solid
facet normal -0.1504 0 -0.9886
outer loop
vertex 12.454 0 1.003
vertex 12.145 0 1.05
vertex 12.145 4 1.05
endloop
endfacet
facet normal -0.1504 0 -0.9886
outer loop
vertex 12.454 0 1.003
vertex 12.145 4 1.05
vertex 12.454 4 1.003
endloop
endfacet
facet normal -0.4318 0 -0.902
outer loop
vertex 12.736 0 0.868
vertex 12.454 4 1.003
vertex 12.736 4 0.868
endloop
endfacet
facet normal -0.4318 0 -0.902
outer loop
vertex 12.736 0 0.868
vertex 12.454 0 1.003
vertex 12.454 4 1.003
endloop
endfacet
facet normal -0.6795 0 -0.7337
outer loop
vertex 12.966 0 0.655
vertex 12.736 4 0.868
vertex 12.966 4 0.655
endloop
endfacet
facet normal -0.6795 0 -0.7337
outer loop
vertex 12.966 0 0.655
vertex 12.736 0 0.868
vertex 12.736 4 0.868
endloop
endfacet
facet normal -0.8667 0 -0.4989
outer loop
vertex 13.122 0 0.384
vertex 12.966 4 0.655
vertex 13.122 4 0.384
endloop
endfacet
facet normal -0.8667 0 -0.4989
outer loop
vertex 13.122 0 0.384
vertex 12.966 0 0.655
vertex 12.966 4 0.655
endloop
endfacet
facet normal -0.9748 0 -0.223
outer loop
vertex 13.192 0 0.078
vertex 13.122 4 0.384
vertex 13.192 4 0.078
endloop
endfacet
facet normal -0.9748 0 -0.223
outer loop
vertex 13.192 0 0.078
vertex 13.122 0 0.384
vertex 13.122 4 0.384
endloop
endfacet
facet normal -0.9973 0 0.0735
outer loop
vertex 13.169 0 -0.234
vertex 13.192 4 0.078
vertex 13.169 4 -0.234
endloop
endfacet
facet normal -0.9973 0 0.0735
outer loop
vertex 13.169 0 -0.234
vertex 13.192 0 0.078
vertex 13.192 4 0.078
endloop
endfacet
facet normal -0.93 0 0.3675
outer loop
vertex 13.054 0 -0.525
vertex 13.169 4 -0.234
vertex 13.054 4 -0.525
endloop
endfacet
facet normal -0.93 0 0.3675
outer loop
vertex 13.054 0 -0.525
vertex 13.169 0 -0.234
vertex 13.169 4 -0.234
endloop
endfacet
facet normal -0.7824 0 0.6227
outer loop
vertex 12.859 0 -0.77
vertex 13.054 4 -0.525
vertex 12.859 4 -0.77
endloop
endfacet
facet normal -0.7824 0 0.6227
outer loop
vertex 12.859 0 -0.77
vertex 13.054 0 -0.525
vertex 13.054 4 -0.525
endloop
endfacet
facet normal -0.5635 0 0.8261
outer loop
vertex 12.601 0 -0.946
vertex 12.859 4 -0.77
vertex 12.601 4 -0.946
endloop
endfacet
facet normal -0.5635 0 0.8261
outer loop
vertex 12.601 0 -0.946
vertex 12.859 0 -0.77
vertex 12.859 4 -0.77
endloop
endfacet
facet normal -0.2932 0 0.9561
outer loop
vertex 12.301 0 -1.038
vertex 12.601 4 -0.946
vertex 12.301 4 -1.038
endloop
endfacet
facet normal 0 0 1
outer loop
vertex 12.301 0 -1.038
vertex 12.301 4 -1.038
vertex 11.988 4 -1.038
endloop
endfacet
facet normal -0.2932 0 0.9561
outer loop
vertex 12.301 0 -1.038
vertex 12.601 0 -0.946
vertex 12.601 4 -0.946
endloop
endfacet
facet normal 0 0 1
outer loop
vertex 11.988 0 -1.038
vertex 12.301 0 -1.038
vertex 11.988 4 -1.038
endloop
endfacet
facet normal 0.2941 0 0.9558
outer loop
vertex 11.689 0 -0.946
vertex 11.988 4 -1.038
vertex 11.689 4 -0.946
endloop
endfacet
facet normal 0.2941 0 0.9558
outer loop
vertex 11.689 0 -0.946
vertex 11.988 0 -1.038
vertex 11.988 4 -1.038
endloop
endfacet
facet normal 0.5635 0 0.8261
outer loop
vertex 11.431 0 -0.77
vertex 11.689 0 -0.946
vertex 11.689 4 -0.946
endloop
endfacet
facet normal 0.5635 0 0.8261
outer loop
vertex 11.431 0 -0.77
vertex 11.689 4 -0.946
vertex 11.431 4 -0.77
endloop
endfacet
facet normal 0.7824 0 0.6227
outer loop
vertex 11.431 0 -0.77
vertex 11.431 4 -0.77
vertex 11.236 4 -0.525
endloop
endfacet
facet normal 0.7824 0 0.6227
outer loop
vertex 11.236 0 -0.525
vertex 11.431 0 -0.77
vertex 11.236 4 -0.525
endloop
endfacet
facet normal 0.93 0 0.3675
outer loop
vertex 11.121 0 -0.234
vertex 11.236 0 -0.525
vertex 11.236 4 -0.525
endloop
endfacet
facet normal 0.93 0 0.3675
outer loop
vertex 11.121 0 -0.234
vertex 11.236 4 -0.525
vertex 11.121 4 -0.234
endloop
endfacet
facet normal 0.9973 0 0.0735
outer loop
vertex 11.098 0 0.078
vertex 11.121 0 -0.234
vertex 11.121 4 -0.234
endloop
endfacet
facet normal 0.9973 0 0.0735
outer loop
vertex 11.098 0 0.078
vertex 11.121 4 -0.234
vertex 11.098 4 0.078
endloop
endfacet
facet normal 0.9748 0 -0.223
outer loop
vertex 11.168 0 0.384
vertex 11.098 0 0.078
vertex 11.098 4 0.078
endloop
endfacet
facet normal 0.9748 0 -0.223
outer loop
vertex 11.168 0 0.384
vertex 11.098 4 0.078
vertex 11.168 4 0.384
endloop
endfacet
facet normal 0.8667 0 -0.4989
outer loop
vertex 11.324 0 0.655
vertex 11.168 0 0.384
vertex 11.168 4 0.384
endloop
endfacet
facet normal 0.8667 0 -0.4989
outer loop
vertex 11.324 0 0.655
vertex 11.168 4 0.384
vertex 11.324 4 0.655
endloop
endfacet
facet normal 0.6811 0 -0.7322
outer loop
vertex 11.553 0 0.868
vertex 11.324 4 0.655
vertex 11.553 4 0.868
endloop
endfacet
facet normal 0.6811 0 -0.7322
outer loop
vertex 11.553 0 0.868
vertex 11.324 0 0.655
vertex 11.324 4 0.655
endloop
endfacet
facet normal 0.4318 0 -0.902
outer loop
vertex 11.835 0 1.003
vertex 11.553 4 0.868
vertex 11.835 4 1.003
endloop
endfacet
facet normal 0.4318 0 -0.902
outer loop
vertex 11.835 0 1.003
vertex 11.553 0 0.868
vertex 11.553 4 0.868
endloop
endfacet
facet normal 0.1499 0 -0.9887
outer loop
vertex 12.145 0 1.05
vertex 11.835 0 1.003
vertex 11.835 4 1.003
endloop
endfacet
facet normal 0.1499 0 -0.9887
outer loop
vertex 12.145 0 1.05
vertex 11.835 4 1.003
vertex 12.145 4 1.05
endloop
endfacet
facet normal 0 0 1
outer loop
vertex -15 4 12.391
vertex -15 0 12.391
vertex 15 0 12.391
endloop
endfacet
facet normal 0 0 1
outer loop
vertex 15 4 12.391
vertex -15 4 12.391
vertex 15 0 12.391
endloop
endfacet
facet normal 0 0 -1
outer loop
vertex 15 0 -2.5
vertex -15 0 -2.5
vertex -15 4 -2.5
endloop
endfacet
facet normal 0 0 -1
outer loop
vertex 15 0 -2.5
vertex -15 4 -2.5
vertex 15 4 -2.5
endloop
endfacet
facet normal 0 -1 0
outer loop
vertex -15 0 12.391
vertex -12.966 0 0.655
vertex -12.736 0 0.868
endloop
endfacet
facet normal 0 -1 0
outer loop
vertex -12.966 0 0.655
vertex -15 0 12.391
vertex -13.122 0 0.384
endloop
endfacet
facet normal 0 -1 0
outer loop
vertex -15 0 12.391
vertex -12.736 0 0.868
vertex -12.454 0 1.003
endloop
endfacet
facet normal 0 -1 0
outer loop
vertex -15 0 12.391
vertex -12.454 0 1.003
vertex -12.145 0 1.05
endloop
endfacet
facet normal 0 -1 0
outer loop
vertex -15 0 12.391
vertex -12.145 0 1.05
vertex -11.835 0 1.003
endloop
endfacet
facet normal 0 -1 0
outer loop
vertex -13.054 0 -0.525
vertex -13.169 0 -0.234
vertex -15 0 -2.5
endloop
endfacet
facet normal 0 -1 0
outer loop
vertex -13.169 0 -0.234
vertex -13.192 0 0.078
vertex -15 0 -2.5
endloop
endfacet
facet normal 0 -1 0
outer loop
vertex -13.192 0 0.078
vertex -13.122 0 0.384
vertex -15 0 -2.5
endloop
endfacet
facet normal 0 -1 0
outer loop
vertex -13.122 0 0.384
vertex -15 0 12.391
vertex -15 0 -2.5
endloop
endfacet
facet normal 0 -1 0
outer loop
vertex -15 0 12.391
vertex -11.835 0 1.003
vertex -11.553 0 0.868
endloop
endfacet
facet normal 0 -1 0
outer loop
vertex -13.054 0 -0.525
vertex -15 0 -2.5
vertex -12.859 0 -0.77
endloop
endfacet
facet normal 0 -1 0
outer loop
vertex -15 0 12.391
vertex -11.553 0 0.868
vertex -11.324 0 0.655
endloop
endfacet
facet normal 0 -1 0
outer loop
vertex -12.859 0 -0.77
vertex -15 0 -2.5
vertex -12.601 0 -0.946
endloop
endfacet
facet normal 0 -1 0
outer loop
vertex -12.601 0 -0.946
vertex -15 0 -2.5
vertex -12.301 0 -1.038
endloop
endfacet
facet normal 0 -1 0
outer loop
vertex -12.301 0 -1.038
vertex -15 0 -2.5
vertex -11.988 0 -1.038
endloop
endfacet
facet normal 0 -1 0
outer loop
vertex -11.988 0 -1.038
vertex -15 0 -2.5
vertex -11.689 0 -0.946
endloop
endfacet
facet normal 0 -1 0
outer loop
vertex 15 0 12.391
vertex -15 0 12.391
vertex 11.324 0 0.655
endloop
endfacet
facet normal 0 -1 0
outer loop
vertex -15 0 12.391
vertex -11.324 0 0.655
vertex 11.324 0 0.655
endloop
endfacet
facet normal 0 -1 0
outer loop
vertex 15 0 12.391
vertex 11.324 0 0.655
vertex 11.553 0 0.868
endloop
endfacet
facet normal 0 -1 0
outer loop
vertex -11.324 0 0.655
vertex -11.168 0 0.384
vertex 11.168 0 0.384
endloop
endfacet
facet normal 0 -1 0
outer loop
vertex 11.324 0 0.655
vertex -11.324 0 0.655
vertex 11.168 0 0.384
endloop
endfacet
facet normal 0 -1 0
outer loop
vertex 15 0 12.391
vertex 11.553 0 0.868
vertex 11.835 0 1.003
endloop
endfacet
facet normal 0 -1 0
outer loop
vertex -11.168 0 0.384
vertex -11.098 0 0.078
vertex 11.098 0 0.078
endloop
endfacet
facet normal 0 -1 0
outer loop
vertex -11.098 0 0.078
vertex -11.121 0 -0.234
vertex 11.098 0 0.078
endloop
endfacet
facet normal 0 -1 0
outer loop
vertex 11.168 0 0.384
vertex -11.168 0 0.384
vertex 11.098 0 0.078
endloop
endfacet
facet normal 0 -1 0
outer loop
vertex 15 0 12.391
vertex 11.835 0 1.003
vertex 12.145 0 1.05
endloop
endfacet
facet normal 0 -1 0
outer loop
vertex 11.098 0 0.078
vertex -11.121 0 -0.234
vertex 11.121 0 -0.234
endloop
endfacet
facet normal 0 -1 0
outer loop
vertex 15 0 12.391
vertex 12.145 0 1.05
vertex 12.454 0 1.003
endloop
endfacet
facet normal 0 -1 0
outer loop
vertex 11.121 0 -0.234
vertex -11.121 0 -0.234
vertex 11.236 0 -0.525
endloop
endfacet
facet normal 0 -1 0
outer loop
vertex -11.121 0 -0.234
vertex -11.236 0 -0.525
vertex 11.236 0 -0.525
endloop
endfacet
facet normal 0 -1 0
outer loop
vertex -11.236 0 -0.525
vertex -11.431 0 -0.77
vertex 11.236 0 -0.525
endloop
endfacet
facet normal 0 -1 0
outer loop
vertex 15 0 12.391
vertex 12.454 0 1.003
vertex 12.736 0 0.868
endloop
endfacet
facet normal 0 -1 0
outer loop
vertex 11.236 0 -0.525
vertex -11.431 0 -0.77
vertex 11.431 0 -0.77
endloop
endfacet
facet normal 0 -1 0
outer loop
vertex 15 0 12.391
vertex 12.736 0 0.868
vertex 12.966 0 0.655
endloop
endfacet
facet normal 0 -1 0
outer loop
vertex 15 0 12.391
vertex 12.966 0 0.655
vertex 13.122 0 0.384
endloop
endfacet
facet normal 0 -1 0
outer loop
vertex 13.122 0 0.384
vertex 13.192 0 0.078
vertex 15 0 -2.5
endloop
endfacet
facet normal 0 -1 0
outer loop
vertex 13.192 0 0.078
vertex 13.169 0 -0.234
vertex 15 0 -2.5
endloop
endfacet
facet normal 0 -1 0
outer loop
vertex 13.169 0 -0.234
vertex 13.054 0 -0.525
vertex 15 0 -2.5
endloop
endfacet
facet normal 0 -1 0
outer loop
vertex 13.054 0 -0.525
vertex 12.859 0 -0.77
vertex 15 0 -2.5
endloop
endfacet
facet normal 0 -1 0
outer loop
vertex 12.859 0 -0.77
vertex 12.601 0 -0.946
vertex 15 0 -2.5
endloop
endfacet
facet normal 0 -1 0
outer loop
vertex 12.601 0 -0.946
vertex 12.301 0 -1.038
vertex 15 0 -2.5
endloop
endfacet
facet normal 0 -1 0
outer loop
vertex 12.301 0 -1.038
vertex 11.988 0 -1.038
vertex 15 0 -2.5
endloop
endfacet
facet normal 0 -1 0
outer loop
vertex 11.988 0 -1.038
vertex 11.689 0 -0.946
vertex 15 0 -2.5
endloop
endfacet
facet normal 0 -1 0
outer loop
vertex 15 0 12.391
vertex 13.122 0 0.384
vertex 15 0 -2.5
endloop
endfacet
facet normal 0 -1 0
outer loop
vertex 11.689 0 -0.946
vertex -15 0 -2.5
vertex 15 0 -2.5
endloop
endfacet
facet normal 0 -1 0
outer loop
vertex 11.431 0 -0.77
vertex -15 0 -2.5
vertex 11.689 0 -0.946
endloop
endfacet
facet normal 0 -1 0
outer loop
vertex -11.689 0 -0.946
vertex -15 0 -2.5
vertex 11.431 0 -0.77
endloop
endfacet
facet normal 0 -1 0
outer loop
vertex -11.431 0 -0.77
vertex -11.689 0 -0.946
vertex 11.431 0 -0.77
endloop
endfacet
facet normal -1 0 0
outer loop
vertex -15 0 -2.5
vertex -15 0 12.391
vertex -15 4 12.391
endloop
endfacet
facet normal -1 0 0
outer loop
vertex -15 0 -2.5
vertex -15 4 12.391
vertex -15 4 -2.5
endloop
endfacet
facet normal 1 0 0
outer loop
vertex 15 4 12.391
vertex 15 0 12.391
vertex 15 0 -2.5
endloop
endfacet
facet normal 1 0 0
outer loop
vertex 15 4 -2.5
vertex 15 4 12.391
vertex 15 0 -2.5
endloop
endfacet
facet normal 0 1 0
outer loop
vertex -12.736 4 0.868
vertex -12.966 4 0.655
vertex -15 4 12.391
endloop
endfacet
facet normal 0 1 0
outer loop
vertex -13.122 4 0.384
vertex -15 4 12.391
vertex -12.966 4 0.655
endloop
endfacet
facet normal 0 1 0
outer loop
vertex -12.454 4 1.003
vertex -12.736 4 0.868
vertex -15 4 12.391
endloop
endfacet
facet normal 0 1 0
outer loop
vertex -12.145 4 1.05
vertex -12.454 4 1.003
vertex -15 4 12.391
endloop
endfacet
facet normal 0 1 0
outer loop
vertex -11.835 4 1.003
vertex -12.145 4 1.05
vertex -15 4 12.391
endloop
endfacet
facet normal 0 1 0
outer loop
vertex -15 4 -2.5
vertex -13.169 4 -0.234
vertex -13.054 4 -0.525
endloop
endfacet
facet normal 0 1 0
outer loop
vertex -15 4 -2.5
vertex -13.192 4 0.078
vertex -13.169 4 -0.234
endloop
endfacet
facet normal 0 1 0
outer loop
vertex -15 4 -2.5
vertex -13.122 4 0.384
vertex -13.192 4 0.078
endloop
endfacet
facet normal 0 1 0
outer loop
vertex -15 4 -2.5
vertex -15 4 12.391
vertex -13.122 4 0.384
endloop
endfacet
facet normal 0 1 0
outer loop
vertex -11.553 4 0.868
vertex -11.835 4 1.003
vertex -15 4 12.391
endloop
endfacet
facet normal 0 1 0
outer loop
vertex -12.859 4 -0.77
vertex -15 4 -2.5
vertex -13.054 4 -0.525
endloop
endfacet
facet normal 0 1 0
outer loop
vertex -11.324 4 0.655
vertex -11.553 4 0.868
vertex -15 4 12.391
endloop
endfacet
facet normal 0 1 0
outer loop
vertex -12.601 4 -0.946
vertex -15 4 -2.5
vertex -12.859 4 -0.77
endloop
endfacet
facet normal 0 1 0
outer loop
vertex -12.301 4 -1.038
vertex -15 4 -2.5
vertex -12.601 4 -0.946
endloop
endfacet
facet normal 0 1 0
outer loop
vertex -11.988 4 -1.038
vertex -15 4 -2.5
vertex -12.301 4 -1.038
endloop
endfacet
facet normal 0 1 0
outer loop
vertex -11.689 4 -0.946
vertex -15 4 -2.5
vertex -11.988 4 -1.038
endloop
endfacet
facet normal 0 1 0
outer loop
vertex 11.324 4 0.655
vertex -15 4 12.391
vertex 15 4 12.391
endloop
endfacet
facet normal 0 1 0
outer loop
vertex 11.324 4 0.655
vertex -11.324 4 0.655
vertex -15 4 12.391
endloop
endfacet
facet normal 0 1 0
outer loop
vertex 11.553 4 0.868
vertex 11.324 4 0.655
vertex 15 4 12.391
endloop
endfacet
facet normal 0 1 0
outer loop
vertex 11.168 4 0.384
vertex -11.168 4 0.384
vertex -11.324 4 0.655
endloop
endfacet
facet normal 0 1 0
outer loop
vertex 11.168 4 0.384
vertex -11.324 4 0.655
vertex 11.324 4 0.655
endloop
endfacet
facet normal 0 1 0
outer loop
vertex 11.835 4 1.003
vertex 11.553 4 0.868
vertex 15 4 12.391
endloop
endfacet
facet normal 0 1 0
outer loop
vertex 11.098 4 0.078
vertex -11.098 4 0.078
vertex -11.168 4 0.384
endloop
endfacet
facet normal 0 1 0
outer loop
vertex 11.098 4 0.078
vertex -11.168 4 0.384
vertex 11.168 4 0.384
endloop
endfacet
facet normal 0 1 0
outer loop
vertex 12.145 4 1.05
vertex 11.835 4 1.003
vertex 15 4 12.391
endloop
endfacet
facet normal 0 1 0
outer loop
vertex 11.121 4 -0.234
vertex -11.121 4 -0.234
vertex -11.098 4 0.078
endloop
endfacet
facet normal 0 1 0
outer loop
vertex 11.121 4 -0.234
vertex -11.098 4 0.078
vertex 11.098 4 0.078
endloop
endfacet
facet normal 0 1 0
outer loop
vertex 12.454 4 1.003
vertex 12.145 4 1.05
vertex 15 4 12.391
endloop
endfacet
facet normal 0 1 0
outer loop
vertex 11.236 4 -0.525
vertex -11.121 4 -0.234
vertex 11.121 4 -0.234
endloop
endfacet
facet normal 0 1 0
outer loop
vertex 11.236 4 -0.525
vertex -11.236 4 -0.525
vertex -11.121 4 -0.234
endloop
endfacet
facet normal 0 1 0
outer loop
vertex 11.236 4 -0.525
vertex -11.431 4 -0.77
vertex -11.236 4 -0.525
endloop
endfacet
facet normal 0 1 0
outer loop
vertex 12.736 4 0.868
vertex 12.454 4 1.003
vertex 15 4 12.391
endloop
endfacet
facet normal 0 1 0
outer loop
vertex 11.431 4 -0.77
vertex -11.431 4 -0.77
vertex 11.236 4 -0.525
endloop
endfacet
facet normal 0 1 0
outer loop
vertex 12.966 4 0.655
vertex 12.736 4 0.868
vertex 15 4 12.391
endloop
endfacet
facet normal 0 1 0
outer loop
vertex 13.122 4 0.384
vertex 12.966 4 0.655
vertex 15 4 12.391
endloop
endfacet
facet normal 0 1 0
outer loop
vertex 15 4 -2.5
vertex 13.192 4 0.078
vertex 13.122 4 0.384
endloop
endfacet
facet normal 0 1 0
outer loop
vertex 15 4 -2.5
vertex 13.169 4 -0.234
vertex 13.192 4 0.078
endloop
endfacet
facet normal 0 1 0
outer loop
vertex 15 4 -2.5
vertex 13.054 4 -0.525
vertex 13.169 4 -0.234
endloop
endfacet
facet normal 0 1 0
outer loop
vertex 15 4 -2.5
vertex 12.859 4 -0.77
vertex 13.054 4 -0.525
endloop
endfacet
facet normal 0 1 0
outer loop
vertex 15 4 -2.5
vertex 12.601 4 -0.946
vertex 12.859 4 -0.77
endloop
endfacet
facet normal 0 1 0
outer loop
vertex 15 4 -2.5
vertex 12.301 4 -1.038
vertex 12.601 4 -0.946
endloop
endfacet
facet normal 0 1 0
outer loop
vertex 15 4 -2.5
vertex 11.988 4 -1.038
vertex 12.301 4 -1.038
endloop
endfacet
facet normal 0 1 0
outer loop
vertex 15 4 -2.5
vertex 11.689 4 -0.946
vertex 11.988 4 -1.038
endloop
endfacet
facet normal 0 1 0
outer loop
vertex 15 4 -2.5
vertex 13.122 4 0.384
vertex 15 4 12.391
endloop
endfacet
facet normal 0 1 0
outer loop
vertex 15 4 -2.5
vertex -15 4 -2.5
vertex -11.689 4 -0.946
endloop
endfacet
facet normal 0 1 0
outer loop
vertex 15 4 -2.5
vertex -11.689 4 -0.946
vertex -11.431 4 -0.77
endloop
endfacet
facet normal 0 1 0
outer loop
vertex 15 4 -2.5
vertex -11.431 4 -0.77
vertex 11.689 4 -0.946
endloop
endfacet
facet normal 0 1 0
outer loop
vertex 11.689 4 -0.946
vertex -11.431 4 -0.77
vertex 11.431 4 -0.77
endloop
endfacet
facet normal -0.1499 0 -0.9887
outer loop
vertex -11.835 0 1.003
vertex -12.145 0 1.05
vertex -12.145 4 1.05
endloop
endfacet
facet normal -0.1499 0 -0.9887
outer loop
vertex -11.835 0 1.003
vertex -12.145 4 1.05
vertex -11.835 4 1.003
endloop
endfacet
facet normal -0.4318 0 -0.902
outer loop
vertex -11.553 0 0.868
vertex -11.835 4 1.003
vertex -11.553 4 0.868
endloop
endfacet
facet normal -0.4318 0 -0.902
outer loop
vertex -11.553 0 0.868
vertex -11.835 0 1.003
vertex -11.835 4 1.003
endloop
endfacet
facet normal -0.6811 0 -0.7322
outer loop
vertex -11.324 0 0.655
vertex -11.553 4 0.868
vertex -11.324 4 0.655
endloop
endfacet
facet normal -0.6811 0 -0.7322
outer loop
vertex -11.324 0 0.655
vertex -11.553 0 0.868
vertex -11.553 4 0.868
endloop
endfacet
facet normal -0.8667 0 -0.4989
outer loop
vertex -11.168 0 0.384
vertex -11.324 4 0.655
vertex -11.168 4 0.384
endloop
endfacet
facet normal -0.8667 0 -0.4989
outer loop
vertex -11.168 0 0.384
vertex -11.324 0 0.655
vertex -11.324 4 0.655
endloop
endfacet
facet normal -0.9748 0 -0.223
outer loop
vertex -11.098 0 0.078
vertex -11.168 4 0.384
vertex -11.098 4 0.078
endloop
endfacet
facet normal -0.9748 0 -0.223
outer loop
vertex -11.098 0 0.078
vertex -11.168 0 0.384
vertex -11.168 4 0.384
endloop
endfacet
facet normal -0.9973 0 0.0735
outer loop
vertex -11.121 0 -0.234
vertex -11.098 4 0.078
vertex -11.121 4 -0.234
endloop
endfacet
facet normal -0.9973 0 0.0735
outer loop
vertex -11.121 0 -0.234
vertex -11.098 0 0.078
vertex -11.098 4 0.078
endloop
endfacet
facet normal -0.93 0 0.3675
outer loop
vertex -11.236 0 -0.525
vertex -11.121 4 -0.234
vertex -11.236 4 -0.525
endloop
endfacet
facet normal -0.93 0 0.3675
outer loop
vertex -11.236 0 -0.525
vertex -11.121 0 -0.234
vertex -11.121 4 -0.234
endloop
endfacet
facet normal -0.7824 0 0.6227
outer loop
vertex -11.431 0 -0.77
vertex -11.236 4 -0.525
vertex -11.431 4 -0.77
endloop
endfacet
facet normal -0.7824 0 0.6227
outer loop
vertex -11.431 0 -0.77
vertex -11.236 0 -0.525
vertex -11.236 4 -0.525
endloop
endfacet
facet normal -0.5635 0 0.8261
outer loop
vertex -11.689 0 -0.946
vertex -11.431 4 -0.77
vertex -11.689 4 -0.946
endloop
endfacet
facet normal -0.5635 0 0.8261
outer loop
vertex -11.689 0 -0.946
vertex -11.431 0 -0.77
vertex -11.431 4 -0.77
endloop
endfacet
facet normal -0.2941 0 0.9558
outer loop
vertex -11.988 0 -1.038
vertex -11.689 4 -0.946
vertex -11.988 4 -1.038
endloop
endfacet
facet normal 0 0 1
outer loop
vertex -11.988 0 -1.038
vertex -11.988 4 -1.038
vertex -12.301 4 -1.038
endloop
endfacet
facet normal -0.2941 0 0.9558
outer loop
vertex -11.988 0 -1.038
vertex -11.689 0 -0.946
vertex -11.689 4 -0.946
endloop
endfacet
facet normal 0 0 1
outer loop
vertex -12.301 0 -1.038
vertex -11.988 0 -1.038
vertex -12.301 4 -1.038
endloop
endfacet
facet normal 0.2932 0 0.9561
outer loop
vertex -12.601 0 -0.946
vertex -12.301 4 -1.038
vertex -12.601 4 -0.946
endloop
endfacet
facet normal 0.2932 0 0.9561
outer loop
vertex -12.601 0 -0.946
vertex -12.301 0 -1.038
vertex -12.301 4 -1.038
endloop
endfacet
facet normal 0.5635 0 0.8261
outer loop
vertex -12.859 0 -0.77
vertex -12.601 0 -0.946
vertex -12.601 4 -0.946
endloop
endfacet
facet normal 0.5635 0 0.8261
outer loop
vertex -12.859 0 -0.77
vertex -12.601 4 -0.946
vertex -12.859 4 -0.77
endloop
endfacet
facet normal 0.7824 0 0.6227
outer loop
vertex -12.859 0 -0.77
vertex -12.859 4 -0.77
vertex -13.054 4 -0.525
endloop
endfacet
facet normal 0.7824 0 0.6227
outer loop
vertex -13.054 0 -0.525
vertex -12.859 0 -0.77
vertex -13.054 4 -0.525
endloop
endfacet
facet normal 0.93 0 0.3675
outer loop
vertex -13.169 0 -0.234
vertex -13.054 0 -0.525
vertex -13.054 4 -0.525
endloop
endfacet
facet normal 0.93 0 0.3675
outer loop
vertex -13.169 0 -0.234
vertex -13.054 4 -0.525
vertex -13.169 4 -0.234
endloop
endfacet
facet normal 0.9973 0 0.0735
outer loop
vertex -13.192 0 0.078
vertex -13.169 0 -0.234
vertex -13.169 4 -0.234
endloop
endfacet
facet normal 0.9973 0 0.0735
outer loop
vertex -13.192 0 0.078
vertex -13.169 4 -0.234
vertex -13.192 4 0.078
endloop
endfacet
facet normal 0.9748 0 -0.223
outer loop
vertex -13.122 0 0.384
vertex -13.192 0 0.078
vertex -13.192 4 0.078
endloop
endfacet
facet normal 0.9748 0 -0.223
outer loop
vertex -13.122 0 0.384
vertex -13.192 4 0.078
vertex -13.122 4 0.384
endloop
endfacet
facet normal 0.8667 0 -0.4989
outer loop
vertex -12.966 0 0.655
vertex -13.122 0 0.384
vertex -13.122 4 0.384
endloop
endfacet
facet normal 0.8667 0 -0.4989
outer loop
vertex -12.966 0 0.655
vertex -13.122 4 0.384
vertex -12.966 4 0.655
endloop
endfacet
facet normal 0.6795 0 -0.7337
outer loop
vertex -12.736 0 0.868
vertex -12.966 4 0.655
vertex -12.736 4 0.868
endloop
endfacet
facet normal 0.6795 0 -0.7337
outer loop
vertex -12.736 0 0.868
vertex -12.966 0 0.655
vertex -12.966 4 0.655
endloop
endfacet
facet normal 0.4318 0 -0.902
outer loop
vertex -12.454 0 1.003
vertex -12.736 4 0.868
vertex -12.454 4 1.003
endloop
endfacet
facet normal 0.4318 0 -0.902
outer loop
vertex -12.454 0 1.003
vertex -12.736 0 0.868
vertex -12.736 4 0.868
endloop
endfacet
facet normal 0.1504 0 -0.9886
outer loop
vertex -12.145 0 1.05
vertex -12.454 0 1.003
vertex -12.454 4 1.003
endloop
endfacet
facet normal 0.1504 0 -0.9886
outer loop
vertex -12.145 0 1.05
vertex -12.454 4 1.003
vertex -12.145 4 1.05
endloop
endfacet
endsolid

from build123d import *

# Parameters (mm, degrees)
SKETCH1_W           = 30
SKETCH1_H           = 5
SKETCH1_R           = 1.05
SKETCH1_H_2         = 9.890975922
BOSS_EXTRUDE1_DEPTH = 4


with BuildPart() as part:
    # Sketch1 → Boss-Extrude1 (new body)
    # profile 1 of 2: a face of its own
    with BuildSketch(Plane(origin=(0, 0, 0), x_dir=(1, 0, 0), z_dir=(0, 1, 0))):
        Rectangle(SKETCH1_W, SKETCH1_H)
        with Locations(Location((12.1449485, 0, 0), (0, 0, 270))):
            Circle(SKETCH1_R, mode=Mode.SUBTRACT)
        with Locations(Location((-12.1449485, 0, 0), (0, 0, 270))):
            Circle(SKETCH1_R, mode=Mode.SUBTRACT)
    # profile 2 of 2: a face of its own
    with BuildSketch(Plane(origin=(0, 0, 0), x_dir=(1, 0, 0), z_dir=(0, 1, 0))):
        with Locations((0, -7.445487961)):
            Rectangle(SKETCH1_W, SKETCH1_H_2)
    extrude(amount=BOSS_EXTRUDE1_DEPTH)


solid = part.part
